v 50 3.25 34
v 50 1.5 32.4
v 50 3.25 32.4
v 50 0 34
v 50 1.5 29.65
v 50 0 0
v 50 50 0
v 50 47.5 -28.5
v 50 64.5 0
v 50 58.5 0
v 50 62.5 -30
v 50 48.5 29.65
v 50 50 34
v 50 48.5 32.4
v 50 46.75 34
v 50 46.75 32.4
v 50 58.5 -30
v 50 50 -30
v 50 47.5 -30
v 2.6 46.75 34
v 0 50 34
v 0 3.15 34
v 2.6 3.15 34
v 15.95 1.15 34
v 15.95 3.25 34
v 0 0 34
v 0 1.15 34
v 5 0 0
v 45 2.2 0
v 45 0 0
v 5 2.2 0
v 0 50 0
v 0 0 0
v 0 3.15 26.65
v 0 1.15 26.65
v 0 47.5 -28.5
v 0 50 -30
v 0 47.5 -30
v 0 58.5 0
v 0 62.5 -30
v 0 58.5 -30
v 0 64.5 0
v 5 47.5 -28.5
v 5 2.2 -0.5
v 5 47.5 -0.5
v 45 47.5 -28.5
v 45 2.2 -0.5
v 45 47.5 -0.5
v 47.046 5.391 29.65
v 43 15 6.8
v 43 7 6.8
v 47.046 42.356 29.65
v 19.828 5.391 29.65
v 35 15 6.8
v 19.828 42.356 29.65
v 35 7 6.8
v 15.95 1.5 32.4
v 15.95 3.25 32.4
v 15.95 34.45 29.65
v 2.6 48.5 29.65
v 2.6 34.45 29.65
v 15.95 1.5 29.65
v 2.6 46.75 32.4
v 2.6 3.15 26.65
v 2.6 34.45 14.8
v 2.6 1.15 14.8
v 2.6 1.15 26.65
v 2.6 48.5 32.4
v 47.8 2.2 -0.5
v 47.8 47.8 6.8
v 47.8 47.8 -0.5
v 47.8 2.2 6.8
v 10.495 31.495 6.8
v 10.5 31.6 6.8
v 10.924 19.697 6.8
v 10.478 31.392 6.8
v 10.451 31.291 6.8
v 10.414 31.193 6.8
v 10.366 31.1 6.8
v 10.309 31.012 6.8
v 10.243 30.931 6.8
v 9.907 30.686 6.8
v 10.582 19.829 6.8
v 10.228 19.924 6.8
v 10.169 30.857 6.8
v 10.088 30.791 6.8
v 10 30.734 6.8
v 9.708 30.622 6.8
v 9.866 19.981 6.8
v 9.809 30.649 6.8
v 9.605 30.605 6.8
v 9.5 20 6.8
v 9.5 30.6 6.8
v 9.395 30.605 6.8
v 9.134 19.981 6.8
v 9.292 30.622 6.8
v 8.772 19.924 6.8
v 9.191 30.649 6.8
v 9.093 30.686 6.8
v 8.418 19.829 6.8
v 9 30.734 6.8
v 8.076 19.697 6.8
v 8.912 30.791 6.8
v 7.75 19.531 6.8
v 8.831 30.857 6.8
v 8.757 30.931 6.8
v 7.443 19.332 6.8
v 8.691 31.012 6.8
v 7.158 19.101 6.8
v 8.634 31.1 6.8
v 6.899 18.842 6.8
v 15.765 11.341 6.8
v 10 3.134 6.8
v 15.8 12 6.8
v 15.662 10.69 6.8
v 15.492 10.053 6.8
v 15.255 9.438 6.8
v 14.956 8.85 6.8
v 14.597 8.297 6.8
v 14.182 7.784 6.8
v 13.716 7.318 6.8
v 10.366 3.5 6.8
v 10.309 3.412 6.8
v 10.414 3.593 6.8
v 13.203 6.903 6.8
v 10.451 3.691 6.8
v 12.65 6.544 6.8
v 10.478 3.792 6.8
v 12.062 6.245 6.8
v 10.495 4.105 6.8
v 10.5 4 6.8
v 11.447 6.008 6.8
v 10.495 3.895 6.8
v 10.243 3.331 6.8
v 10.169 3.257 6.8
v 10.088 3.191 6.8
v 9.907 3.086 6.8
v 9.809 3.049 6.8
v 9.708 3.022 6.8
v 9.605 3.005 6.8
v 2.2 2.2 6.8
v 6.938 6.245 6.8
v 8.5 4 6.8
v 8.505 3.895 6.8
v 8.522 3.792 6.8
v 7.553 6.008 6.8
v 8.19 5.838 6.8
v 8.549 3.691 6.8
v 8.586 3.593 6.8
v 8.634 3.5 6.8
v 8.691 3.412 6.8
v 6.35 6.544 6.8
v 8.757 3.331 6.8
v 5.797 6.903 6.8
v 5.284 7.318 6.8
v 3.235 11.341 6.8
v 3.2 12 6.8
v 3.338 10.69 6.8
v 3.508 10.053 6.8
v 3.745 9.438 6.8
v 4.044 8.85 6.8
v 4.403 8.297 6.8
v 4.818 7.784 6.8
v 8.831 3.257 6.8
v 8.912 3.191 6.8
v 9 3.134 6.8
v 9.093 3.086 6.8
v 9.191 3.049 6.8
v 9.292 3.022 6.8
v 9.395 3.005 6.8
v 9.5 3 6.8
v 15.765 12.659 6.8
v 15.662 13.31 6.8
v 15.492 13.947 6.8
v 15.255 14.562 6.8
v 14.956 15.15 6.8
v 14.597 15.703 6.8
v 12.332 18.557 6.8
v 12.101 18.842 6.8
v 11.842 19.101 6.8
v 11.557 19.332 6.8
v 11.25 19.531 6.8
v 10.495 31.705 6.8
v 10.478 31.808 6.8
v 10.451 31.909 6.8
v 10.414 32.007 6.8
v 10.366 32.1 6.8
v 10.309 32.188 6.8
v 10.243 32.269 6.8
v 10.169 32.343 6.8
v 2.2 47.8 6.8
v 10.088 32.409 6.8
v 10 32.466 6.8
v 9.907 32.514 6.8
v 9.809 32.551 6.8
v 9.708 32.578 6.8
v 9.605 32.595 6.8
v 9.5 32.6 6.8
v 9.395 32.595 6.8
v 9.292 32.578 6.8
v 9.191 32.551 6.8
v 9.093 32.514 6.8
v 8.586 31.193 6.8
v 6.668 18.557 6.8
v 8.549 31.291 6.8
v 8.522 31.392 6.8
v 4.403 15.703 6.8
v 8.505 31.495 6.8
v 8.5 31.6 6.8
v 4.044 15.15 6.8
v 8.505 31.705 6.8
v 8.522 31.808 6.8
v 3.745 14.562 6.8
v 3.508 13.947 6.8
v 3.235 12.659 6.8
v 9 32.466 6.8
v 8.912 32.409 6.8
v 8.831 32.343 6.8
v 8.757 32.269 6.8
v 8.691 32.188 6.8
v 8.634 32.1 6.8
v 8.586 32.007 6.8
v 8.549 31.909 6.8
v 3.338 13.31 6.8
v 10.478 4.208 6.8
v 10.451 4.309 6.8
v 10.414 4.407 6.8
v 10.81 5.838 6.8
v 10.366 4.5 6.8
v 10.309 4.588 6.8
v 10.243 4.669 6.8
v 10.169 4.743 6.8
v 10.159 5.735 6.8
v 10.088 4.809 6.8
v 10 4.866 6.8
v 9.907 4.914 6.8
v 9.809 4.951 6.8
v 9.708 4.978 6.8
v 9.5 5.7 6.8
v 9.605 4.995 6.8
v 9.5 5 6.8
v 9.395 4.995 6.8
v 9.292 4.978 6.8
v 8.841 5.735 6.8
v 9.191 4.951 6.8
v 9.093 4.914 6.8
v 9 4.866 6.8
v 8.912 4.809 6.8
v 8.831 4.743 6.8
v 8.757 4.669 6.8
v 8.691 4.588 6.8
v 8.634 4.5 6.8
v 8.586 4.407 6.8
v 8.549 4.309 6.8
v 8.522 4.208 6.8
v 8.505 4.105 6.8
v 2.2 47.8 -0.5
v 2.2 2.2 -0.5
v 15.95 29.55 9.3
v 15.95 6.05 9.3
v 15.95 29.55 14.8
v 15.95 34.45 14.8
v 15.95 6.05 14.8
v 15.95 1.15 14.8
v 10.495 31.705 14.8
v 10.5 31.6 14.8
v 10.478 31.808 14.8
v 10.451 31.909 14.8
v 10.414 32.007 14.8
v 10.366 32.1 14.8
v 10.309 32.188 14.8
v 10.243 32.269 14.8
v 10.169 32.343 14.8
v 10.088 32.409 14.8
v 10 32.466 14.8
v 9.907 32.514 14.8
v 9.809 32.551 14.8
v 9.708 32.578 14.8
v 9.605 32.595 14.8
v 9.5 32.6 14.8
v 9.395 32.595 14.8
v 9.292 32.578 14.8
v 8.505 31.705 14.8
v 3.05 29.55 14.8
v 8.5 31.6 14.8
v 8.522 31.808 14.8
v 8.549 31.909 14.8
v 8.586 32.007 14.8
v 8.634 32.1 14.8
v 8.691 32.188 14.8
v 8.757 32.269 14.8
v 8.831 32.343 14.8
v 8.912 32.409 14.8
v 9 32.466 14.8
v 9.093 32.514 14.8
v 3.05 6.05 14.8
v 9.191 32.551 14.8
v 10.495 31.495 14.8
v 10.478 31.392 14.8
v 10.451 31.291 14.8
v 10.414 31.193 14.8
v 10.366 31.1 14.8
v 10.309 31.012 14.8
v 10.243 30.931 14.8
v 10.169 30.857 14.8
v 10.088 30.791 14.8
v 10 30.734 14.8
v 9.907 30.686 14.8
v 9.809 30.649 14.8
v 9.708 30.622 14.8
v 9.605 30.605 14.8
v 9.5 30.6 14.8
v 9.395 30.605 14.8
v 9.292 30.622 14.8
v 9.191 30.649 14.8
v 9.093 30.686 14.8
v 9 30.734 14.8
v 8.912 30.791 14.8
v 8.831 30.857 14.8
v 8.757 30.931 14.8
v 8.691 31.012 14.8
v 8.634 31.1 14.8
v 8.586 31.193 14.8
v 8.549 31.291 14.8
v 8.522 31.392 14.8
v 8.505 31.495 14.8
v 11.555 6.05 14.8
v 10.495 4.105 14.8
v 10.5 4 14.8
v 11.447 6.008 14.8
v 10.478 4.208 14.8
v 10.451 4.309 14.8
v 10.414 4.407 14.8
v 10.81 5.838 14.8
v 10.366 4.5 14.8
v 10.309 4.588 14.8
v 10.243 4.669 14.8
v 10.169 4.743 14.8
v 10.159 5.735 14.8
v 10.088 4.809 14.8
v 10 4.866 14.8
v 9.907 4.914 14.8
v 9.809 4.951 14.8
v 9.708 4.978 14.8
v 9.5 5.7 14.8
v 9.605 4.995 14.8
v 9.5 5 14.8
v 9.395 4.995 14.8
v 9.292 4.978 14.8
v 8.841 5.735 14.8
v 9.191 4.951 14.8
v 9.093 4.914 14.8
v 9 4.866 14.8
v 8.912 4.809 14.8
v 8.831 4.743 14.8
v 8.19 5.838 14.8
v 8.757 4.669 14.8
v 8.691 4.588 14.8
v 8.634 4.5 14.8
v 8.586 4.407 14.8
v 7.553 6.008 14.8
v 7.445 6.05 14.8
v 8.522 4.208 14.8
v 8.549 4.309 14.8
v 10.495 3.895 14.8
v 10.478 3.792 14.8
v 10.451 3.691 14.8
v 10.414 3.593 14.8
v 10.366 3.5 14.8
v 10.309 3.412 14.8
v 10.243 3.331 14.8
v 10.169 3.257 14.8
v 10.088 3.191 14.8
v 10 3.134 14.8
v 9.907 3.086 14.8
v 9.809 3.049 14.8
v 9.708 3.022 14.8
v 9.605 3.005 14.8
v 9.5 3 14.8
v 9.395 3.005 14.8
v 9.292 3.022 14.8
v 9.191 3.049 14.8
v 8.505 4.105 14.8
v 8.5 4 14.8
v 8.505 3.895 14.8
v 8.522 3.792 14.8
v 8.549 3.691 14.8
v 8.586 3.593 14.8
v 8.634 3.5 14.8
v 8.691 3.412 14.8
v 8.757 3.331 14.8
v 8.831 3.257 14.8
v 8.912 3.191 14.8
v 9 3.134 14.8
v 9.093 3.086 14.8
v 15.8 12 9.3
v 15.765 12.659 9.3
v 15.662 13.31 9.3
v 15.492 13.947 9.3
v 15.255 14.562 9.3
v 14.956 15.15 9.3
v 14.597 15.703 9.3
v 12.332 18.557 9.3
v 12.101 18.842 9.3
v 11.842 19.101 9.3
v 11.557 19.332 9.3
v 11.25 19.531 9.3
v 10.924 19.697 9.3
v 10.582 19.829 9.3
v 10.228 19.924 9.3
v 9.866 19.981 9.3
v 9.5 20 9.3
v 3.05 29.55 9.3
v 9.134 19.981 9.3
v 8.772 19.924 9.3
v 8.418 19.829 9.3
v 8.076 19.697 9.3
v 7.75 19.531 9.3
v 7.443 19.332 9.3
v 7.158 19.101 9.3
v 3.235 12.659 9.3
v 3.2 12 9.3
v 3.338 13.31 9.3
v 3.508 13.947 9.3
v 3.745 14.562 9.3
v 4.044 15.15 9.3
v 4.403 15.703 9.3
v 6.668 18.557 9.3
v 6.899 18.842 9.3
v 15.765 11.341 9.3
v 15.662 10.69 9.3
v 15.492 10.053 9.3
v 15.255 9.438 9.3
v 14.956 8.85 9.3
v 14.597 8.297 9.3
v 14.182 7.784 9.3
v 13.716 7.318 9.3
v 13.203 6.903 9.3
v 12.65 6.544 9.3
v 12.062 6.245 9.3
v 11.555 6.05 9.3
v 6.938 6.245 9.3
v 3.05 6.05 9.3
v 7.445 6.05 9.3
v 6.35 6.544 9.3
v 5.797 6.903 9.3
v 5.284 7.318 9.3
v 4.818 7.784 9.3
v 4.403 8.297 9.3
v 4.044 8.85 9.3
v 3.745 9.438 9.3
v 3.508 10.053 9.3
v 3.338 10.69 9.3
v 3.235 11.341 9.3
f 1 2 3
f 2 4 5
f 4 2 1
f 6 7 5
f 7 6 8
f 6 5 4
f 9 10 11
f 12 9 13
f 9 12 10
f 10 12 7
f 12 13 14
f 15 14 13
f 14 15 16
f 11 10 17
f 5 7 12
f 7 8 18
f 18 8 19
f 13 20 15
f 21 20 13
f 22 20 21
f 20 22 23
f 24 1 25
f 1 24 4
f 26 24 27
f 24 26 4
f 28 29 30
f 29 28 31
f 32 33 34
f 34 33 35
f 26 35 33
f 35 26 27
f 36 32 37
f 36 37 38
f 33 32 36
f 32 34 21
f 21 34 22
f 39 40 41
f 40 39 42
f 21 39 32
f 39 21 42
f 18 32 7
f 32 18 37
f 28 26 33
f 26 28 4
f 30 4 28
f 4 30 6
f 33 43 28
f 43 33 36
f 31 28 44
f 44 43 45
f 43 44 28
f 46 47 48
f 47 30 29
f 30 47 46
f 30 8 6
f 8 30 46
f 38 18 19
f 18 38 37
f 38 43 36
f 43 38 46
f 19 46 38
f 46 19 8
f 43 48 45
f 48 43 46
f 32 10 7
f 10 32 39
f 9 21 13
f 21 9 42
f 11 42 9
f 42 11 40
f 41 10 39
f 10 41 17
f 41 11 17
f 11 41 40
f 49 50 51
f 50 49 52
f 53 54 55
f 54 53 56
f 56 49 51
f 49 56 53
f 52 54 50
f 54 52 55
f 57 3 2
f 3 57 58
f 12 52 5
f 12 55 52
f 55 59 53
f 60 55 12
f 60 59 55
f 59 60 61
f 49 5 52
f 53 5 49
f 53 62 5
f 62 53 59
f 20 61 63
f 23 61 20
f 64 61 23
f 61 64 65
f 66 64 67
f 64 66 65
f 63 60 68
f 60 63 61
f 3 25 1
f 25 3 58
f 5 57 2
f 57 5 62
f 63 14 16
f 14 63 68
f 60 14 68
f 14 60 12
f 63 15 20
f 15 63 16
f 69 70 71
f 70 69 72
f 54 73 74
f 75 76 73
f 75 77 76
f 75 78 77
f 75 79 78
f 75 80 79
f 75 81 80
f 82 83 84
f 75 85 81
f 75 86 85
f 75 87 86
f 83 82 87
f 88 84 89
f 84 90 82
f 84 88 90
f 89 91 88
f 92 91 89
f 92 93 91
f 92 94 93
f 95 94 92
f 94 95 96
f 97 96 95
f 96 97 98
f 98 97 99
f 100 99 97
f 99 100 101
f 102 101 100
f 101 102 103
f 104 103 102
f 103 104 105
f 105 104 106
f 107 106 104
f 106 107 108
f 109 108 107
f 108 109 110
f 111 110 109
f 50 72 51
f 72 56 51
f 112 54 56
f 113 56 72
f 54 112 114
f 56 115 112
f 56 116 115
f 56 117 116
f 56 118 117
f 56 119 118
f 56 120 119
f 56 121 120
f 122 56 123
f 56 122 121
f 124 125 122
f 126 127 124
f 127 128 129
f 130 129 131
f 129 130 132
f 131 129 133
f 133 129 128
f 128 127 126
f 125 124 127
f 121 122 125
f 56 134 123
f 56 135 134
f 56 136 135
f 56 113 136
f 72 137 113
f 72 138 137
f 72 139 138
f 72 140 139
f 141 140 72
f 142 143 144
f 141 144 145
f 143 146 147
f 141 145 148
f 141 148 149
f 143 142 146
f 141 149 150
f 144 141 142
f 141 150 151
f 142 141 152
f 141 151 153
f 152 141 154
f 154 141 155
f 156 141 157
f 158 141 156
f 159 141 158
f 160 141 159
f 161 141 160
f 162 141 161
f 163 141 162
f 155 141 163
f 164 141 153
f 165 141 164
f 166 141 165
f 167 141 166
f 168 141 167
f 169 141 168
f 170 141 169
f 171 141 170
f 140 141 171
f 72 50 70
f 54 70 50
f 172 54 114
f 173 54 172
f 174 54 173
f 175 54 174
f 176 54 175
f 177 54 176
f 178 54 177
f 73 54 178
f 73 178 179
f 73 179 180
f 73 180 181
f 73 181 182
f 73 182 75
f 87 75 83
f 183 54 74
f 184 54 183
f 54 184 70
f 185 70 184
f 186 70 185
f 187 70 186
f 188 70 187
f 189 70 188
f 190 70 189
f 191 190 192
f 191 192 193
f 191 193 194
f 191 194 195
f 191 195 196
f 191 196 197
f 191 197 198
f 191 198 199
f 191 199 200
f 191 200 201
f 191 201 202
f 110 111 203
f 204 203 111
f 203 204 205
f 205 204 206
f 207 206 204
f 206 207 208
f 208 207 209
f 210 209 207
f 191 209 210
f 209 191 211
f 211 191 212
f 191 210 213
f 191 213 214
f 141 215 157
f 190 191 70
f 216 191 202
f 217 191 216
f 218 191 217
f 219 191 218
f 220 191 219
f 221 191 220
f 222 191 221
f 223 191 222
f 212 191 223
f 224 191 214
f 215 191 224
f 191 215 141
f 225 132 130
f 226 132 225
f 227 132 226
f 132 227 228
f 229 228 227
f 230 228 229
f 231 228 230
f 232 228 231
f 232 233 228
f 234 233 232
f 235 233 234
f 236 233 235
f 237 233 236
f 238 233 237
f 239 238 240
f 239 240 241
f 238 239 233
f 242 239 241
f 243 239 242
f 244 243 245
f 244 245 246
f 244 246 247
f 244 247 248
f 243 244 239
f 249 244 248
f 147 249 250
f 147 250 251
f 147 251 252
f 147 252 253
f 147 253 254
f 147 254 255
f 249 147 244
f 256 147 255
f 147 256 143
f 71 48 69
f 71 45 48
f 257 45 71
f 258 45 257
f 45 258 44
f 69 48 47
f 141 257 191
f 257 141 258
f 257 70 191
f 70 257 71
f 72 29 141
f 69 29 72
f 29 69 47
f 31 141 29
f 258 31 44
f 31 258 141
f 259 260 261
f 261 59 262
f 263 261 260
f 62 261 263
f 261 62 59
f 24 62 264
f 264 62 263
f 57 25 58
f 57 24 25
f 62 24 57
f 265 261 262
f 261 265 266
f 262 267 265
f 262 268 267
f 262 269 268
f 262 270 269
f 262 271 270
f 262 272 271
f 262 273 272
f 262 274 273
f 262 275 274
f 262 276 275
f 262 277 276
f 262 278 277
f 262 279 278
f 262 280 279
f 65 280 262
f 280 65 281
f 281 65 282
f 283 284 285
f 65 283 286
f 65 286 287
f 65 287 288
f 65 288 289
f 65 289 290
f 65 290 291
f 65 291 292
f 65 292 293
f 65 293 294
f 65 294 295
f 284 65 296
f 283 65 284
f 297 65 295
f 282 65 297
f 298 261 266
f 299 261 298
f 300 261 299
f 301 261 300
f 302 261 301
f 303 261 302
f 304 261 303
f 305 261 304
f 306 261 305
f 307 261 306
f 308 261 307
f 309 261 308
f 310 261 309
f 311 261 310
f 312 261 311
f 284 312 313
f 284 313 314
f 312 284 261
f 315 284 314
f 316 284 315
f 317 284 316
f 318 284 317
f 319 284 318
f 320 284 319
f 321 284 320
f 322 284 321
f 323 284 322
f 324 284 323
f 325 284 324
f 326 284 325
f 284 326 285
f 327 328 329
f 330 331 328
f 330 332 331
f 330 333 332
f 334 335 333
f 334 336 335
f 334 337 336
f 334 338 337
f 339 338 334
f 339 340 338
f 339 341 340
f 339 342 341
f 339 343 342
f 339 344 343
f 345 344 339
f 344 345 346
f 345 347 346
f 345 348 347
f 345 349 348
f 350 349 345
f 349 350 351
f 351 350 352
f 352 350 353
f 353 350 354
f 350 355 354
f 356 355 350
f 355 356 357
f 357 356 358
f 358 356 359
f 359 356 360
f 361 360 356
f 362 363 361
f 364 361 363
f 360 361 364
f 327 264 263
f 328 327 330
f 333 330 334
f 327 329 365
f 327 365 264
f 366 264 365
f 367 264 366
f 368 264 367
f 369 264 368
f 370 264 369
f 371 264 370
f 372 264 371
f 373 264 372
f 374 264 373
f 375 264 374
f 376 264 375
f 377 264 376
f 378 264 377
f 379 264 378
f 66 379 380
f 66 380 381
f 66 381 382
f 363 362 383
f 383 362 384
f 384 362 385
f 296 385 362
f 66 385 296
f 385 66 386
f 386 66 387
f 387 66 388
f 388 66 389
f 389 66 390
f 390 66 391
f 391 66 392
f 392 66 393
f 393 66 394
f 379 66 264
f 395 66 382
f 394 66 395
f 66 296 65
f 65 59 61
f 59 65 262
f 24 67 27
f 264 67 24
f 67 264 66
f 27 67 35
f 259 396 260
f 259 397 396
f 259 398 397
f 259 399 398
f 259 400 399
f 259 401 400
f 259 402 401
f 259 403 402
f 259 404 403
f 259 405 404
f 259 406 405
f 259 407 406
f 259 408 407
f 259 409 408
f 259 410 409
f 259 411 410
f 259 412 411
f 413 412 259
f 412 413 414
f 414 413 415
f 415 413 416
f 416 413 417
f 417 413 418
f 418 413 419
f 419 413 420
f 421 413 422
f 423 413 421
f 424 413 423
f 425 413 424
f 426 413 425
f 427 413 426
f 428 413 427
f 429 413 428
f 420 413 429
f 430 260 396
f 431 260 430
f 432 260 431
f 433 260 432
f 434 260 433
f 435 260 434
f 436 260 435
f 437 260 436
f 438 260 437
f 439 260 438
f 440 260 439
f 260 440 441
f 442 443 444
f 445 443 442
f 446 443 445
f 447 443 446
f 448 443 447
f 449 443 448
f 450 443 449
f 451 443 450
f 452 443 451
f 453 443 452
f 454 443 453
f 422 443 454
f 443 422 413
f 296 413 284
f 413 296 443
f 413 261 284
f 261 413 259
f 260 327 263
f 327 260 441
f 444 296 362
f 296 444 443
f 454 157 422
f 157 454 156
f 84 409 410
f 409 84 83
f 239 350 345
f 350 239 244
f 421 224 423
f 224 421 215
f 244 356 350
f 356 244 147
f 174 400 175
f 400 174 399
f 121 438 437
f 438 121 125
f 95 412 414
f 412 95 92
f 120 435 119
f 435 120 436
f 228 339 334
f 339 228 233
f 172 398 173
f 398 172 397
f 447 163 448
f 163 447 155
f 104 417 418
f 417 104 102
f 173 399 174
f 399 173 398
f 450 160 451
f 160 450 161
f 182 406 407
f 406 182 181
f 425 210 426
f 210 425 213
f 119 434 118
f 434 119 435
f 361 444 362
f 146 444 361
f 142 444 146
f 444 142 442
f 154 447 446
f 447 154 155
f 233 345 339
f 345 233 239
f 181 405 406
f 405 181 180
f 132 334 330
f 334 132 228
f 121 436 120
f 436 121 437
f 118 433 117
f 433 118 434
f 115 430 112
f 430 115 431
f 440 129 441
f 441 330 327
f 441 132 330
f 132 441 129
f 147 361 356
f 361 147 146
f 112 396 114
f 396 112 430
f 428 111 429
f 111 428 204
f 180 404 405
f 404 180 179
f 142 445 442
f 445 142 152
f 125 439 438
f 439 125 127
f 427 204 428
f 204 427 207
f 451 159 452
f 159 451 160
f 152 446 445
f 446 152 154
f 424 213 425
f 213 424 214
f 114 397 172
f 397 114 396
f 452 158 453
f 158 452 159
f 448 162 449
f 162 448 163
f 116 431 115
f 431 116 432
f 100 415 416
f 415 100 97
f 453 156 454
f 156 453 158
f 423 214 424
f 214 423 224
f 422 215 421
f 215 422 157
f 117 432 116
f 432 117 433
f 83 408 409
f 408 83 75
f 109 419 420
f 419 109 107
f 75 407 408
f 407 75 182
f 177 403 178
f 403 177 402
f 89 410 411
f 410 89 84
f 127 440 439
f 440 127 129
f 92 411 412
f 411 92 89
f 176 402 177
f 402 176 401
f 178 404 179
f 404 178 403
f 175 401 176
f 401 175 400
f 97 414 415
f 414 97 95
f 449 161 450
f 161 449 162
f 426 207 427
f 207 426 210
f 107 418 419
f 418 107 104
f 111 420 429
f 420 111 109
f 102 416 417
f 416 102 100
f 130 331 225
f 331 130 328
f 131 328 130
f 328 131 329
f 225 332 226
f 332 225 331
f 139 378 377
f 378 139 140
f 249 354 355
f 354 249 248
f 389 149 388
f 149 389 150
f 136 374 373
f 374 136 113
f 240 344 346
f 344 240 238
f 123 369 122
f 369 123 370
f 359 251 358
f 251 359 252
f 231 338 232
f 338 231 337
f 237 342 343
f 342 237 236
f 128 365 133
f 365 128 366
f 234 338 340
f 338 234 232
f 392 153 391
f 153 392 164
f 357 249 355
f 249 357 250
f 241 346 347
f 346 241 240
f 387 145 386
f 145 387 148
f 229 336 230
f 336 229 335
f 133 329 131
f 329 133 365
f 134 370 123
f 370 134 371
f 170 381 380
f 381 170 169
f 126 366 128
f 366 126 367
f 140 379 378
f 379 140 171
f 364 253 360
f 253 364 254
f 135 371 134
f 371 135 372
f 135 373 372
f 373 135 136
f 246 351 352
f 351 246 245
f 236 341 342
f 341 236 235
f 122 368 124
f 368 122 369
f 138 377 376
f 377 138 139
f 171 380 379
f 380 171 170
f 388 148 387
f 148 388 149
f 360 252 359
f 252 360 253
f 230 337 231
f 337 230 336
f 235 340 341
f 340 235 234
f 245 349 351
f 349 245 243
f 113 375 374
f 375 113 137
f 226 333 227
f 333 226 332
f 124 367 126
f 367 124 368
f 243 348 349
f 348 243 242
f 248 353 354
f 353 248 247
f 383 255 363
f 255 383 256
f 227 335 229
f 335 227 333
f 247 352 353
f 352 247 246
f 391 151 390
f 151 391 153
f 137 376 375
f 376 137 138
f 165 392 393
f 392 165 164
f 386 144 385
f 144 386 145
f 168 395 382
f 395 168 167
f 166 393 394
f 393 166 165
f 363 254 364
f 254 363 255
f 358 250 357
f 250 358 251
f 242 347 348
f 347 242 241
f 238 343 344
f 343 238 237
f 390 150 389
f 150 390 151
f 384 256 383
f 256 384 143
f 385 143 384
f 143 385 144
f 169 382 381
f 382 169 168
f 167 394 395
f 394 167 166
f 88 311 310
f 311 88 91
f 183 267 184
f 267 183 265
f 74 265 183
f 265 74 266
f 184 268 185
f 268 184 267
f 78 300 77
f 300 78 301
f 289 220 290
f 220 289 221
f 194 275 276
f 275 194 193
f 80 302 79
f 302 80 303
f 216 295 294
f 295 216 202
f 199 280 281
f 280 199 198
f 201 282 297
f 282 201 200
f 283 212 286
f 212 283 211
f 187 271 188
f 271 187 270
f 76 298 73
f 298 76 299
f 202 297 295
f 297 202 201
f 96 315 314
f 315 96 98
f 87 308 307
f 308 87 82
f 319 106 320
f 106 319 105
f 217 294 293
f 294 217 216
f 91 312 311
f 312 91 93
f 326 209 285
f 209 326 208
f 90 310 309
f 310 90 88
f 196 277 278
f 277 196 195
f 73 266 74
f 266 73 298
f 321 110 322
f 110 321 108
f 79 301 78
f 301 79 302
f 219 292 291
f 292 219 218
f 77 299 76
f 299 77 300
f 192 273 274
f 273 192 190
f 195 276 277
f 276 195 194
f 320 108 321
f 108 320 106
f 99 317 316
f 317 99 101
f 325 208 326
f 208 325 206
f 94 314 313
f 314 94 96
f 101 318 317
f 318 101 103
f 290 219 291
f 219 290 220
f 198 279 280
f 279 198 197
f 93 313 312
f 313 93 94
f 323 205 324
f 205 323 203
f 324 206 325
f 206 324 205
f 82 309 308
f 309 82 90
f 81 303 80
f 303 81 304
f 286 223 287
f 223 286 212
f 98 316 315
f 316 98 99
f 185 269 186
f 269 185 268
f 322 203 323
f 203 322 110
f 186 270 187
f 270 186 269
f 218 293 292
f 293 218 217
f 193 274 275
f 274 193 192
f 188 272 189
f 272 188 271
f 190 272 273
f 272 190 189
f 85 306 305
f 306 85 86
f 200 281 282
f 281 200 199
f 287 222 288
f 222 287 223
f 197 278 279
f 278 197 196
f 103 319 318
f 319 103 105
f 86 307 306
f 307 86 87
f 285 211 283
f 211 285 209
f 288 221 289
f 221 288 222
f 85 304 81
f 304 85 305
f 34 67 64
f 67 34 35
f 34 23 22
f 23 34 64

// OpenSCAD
$fn = 60;

panjang_x = 50.0; lebar_y = 50.0; tinggi_bawah_z = 34.0; toleransi = 0.25;
lebar_lidah = 1.5; tinggi_lidah = 2.5; tebal_bibir = 1.5; tinggi_bibir_atas = 1.6;
tinggi_alur_total = tinggi_lidah + toleransi + tinggi_bibir_atas;
lubang_keluar = 8.0; tebal_dinding = 2.6; tinggi_kolong_bawah = 6.8; tebal_pembatas_bawah = 2.2;

mg90s_bodi_x = 12.2; mg90s_bodi_y = 22.8; mg90s_kuping_y = 32.6;
mg90s_pitch_baut = 27.6; mg90s_offset_poros = 5.6; mg90s_diameter_baut = 2.0;
servo_clearance = 0.35; tinggi_baut_ke_poros = 8.0;

posisi_poros_x = 9.5; posisi_poros_y = 12.0;
posisi_lubang_x = 39.0; posisi_lubang_y = 11.0; batas_kiri_corong_x = 18.5;
z_mulai_corong_global = 42.0; lantai_alur_z = tinggi_bawah_z - tinggi_alur_total;

lebar_rel = tebal_bibir + lebar_lidah + toleransi; // 3.25 mm
tebal_dinding_samping_corong = 2.0;
corong_y_min = lebar_rel + tebal_dinding_samping_corong; // 5.25 mm (mencegah tembus ke rel)
corong_lebar_y = lebar_y - (2 * corong_y_min); // 39.5 mm

// Parameter Klem Penjepit Kaca Slip-On (Solid Tanpa Baut/Lubang)
celah_kaca = 8.5;            // Lebar celah untuk kaca akuarium 8 mm (+ toleransi geser 0.5 mm)
tinggi_klem = 30.0;          // Panjang dinding penjepit ke bawah
tebal_klem_luar_atas = 6.0;  // Ketebalan dinding luar klem atas (6.0 mm)
tebal_klem_luar_bawah = 4.0; // Ketebalan dinding luar klem bawah (solid 4.0 mm)

tebal_sirip_segitiga = 5.0;  // Tebal sirip segitiga di pinggiran depan & belakang

y_klem_luar = lebar_y + celah_kaca;
y_klem_ujung = y_klem_luar + tebal_klem_luar_atas;

module profil_corong_global() {
    rongga_penuh_x = panjang_x - (2 * tebal_dinding);
    rongga_penuh_y = lebar_y - (2 * tebal_dinding);
    lebar_corong_tengah_x = (panjang_x - tebal_dinding) - batas_kiri_corong_x;

    // Corong melandai di sumbu X dan Y agar dinding samping rel tetap tebal & tidak bolong
    hull() {
        translate([tebal_dinding, tebal_dinding, z_mulai_corong_global])
            cube([rongga_penuh_x, rongga_penuh_y, 0.1]);
        translate([batas_kiri_corong_x, corong_y_min, lantai_alur_z + 2.0])
            cube([lebar_corong_tengah_x, corong_lebar_y, 0.1]);
    }
    hull() {
        translate([batas_kiri_corong_x, corong_y_min, lantai_alur_z + 2.0])
            cube([lebar_corong_tengah_x, corong_lebar_y, 0.1]);
        translate([posisi_lubang_x - (lubang_keluar / 2), posisi_lubang_y - (lubang_keluar / 2), tinggi_kolong_bawah])
            cube([lubang_keluar, lubang_keluar, 0.1]);
    }
    translate([posisi_lubang_x - (lubang_keluar / 2), posisi_lubang_y - (lubang_keluar / 2), tinggi_kolong_bawah - 1])
        cube([lubang_keluar, lubang_keluar, 2.0]);
}

lantai_kuping_z = tinggi_kolong_bawah + tinggi_baut_ke_poros;

pusat_bodi_y = posisi_poros_y - mg90s_offset_poros + (mg90s_bodi_y / 2);
posisi_baut_1_y = pusat_bodi_y - (mg90s_pitch_baut / 2);
posisi_baut_2_y = pusat_bodi_y + (mg90s_pitch_baut / 2);

lebar_kantong_x = mg90s_bodi_x + (2 * servo_clearance);
panjang_kantong_y = mg90s_bodi_y + (2 * servo_clearance);
panjang_kuping_y = mg90s_kuping_y + (2 * servo_clearance);

// Profil 2D segitiga bawah penopang
module profil_segitiga_bawah_2d() {
    polygon(points = [
        [0, 0],
        [lebar_y, 0],
        [lebar_y, -tinggi_klem]
    ]);
}

module laci_servo() {
    difference() {
        union() {
            // Kotak laci servo utama
            cube([panjang_x, lebar_y, tinggi_bawah_z]);

            // 1. Sirip Segitiga Bawah HANYA di Pinggiran (Kiri & Kanan), bagian tengah terbuka untuk akses katup
            // Sirip pinggir depan (X = 0 s/d tebal_sirip_segitiga)
            rotate([90, 0, 90])
            linear_extrude(height = tebal_sirip_segitiga)
                profil_segitiga_bawah_2d();

            // Sirip pinggir belakang (X = panjang_x - tebal_sirip_segitiga s/d panjang_x)
            translate([panjang_x - tebal_sirip_segitiga, 0, 0])
            rotate([90, 0, 90])
            linear_extrude(height = tebal_sirip_segitiga)
                profil_segitiga_bawah_2d();

            // Dinding penahan dalam yang bersandar ke kaca akuarium (Y = lebar_y - 2.5 s/d lebar_y)
            translate([0, lebar_y - 2.5, -tinggi_klem])
                cube([panjang_x, 2.5, tinggi_klem]);

            // 2. Segitiga atas pengikat klem luar ke bodi laci
            rotate([90, 0, 90])
            linear_extrude(height = panjang_x)
                polygon(points = [
                    [lebar_y, 0],
                    [lebar_y, tinggi_bawah_z],
                    [y_klem_ujung, 0]
                ]);

            // 3. Dinding klem luar tebal solid (Murni jepit tanpa baut/lubang)
            rotate([90, 0, 90])
            linear_extrude(height = panjang_x)
                polygon(points = [
                    [y_klem_luar, 0],
                    [y_klem_ujung, 0],
                    [y_klem_luar + tebal_klem_luar_bawah, -tinggi_klem],
                    [y_klem_luar, -tinggi_klem]
                ]);
        }

        // Rel alur kiri (terbuka di X = 50, stopper di dinding kanan X = 0 s/d tebal_dinding)
        translate([tebal_dinding, tebal_bibir, lantai_alur_z])
            cube([panjang_x - tebal_dinding + 1, lebar_lidah + toleransi, tinggi_lidah + toleransi]);

        // Rel alur kanan (terbuka di X = 50, stopper di dinding kanan X = 0 s/d tebal_dinding)
        translate([tebal_dinding, lebar_y - tebal_bibir - (lebar_lidah + toleransi), lantai_alur_z])
            cube([panjang_x - tebal_dinding + 1, lebar_lidah + toleransi, tinggi_lidah + toleransi]);

        // Rongga tengah atas dipotong rapi dari tebal_dinding sampai ujung kiri X = 50 (tembus keluar)
        translate([tebal_dinding, lebar_rel, lantai_alur_z])
            cube([panjang_x - tebal_dinding + 1, lebar_y - (2 * lebar_rel), tinggi_alur_total + 0.1]);



        // Kolong bawah untuk katup horn berputar (terbuka leluasa dari bawah)
        translate([tebal_pembatas_bawah, tebal_pembatas_bawah, -0.5])
            cube([panjang_x - (2 * tebal_pembatas_bawah), lebar_y - (2 * tebal_pembatas_bawah), tinggi_kolong_bawah + 0.5]);

        profil_corong_global();

        // Kantong servo presisi MG90S
        // 1. Rongga atas untuk kuping baut servo (seukuran dan simetris presisi antara lubang baut atas dan bawah)
        translate([posisi_poros_x - lebar_kantong_x / 2 - 0.45, pusat_bodi_y - panjang_kuping_y / 2, lantai_kuping_z])
            cube([lebar_kantong_x + 0.45, panjang_kuping_y, tinggi_bawah_z]);

        // 2. Dudukan bodi bawah servo (5.5 mm di bawah lantai kuping agar kuping duduk rata sempurna)
        translate([posisi_poros_x - lebar_kantong_x / 2, pusat_bodi_y - panjang_kantong_y / 2, lantai_kuping_z - 5.5])
            cube([lebar_kantong_x, panjang_kantong_y, 6.0]);

        // 3. Lubang leher gir dan poros MG90S tembus bersih ke kolong katup
        hull() {
            translate([posisi_poros_x, posisi_poros_y, tinggi_kolong_bawah - 1.0])
                cylinder(h = tinggi_baut_ke_poros + 2.0, d = 12.6);
            translate([posisi_poros_x, posisi_poros_y + 4.5, tinggi_kolong_bawah - 1.0])
                cylinder(h = tinggi_baut_ke_poros + 2.0, d = 7.0);
        }

        // 4. Lubang sekrup kuping MG90S (diameter 2.0 mm, kedalaman 8.0 mm pas dengan sekrup bawaan)
        translate([posisi_poros_x, posisi_baut_1_y, lantai_kuping_z - 8.0])
            cylinder(h = 8.5, d = mg90s_diameter_baut);
        translate([posisi_poros_x, posisi_baut_2_y, lantai_kuping_z - 8.0])
            cylinder(h = 8.5, d = mg90s_diameter_baut);

        // 5. Jalur kabel servo di sebelah kiri (Y = 8.0 mm) dangkal rapi (tidak terlalu dalam)
        lebar_kabel_mg90s = 2.0;
        y_posisi_kabel = 2.15; // Di sebelah kiri poros gir (antara baut 1 di Y=4 dan poros di Y=12)
        kedalaman_kabel_dari_rel = 3.0; // Cukup 2.5 mm di bawah lantai rel agar tidak terlalu dalam
        translate([-0.5, y_posisi_kabel - (lebar_kabel_mg90s / 2), lantai_alur_z - kedalaman_kabel_dari_rel])
            cube([tebal_dinding + 1.5, lebar_kabel_mg90s, tinggi_alur_total + kedalaman_kabel_dari_rel + 0.5]);
    }
}

laci_servo();
